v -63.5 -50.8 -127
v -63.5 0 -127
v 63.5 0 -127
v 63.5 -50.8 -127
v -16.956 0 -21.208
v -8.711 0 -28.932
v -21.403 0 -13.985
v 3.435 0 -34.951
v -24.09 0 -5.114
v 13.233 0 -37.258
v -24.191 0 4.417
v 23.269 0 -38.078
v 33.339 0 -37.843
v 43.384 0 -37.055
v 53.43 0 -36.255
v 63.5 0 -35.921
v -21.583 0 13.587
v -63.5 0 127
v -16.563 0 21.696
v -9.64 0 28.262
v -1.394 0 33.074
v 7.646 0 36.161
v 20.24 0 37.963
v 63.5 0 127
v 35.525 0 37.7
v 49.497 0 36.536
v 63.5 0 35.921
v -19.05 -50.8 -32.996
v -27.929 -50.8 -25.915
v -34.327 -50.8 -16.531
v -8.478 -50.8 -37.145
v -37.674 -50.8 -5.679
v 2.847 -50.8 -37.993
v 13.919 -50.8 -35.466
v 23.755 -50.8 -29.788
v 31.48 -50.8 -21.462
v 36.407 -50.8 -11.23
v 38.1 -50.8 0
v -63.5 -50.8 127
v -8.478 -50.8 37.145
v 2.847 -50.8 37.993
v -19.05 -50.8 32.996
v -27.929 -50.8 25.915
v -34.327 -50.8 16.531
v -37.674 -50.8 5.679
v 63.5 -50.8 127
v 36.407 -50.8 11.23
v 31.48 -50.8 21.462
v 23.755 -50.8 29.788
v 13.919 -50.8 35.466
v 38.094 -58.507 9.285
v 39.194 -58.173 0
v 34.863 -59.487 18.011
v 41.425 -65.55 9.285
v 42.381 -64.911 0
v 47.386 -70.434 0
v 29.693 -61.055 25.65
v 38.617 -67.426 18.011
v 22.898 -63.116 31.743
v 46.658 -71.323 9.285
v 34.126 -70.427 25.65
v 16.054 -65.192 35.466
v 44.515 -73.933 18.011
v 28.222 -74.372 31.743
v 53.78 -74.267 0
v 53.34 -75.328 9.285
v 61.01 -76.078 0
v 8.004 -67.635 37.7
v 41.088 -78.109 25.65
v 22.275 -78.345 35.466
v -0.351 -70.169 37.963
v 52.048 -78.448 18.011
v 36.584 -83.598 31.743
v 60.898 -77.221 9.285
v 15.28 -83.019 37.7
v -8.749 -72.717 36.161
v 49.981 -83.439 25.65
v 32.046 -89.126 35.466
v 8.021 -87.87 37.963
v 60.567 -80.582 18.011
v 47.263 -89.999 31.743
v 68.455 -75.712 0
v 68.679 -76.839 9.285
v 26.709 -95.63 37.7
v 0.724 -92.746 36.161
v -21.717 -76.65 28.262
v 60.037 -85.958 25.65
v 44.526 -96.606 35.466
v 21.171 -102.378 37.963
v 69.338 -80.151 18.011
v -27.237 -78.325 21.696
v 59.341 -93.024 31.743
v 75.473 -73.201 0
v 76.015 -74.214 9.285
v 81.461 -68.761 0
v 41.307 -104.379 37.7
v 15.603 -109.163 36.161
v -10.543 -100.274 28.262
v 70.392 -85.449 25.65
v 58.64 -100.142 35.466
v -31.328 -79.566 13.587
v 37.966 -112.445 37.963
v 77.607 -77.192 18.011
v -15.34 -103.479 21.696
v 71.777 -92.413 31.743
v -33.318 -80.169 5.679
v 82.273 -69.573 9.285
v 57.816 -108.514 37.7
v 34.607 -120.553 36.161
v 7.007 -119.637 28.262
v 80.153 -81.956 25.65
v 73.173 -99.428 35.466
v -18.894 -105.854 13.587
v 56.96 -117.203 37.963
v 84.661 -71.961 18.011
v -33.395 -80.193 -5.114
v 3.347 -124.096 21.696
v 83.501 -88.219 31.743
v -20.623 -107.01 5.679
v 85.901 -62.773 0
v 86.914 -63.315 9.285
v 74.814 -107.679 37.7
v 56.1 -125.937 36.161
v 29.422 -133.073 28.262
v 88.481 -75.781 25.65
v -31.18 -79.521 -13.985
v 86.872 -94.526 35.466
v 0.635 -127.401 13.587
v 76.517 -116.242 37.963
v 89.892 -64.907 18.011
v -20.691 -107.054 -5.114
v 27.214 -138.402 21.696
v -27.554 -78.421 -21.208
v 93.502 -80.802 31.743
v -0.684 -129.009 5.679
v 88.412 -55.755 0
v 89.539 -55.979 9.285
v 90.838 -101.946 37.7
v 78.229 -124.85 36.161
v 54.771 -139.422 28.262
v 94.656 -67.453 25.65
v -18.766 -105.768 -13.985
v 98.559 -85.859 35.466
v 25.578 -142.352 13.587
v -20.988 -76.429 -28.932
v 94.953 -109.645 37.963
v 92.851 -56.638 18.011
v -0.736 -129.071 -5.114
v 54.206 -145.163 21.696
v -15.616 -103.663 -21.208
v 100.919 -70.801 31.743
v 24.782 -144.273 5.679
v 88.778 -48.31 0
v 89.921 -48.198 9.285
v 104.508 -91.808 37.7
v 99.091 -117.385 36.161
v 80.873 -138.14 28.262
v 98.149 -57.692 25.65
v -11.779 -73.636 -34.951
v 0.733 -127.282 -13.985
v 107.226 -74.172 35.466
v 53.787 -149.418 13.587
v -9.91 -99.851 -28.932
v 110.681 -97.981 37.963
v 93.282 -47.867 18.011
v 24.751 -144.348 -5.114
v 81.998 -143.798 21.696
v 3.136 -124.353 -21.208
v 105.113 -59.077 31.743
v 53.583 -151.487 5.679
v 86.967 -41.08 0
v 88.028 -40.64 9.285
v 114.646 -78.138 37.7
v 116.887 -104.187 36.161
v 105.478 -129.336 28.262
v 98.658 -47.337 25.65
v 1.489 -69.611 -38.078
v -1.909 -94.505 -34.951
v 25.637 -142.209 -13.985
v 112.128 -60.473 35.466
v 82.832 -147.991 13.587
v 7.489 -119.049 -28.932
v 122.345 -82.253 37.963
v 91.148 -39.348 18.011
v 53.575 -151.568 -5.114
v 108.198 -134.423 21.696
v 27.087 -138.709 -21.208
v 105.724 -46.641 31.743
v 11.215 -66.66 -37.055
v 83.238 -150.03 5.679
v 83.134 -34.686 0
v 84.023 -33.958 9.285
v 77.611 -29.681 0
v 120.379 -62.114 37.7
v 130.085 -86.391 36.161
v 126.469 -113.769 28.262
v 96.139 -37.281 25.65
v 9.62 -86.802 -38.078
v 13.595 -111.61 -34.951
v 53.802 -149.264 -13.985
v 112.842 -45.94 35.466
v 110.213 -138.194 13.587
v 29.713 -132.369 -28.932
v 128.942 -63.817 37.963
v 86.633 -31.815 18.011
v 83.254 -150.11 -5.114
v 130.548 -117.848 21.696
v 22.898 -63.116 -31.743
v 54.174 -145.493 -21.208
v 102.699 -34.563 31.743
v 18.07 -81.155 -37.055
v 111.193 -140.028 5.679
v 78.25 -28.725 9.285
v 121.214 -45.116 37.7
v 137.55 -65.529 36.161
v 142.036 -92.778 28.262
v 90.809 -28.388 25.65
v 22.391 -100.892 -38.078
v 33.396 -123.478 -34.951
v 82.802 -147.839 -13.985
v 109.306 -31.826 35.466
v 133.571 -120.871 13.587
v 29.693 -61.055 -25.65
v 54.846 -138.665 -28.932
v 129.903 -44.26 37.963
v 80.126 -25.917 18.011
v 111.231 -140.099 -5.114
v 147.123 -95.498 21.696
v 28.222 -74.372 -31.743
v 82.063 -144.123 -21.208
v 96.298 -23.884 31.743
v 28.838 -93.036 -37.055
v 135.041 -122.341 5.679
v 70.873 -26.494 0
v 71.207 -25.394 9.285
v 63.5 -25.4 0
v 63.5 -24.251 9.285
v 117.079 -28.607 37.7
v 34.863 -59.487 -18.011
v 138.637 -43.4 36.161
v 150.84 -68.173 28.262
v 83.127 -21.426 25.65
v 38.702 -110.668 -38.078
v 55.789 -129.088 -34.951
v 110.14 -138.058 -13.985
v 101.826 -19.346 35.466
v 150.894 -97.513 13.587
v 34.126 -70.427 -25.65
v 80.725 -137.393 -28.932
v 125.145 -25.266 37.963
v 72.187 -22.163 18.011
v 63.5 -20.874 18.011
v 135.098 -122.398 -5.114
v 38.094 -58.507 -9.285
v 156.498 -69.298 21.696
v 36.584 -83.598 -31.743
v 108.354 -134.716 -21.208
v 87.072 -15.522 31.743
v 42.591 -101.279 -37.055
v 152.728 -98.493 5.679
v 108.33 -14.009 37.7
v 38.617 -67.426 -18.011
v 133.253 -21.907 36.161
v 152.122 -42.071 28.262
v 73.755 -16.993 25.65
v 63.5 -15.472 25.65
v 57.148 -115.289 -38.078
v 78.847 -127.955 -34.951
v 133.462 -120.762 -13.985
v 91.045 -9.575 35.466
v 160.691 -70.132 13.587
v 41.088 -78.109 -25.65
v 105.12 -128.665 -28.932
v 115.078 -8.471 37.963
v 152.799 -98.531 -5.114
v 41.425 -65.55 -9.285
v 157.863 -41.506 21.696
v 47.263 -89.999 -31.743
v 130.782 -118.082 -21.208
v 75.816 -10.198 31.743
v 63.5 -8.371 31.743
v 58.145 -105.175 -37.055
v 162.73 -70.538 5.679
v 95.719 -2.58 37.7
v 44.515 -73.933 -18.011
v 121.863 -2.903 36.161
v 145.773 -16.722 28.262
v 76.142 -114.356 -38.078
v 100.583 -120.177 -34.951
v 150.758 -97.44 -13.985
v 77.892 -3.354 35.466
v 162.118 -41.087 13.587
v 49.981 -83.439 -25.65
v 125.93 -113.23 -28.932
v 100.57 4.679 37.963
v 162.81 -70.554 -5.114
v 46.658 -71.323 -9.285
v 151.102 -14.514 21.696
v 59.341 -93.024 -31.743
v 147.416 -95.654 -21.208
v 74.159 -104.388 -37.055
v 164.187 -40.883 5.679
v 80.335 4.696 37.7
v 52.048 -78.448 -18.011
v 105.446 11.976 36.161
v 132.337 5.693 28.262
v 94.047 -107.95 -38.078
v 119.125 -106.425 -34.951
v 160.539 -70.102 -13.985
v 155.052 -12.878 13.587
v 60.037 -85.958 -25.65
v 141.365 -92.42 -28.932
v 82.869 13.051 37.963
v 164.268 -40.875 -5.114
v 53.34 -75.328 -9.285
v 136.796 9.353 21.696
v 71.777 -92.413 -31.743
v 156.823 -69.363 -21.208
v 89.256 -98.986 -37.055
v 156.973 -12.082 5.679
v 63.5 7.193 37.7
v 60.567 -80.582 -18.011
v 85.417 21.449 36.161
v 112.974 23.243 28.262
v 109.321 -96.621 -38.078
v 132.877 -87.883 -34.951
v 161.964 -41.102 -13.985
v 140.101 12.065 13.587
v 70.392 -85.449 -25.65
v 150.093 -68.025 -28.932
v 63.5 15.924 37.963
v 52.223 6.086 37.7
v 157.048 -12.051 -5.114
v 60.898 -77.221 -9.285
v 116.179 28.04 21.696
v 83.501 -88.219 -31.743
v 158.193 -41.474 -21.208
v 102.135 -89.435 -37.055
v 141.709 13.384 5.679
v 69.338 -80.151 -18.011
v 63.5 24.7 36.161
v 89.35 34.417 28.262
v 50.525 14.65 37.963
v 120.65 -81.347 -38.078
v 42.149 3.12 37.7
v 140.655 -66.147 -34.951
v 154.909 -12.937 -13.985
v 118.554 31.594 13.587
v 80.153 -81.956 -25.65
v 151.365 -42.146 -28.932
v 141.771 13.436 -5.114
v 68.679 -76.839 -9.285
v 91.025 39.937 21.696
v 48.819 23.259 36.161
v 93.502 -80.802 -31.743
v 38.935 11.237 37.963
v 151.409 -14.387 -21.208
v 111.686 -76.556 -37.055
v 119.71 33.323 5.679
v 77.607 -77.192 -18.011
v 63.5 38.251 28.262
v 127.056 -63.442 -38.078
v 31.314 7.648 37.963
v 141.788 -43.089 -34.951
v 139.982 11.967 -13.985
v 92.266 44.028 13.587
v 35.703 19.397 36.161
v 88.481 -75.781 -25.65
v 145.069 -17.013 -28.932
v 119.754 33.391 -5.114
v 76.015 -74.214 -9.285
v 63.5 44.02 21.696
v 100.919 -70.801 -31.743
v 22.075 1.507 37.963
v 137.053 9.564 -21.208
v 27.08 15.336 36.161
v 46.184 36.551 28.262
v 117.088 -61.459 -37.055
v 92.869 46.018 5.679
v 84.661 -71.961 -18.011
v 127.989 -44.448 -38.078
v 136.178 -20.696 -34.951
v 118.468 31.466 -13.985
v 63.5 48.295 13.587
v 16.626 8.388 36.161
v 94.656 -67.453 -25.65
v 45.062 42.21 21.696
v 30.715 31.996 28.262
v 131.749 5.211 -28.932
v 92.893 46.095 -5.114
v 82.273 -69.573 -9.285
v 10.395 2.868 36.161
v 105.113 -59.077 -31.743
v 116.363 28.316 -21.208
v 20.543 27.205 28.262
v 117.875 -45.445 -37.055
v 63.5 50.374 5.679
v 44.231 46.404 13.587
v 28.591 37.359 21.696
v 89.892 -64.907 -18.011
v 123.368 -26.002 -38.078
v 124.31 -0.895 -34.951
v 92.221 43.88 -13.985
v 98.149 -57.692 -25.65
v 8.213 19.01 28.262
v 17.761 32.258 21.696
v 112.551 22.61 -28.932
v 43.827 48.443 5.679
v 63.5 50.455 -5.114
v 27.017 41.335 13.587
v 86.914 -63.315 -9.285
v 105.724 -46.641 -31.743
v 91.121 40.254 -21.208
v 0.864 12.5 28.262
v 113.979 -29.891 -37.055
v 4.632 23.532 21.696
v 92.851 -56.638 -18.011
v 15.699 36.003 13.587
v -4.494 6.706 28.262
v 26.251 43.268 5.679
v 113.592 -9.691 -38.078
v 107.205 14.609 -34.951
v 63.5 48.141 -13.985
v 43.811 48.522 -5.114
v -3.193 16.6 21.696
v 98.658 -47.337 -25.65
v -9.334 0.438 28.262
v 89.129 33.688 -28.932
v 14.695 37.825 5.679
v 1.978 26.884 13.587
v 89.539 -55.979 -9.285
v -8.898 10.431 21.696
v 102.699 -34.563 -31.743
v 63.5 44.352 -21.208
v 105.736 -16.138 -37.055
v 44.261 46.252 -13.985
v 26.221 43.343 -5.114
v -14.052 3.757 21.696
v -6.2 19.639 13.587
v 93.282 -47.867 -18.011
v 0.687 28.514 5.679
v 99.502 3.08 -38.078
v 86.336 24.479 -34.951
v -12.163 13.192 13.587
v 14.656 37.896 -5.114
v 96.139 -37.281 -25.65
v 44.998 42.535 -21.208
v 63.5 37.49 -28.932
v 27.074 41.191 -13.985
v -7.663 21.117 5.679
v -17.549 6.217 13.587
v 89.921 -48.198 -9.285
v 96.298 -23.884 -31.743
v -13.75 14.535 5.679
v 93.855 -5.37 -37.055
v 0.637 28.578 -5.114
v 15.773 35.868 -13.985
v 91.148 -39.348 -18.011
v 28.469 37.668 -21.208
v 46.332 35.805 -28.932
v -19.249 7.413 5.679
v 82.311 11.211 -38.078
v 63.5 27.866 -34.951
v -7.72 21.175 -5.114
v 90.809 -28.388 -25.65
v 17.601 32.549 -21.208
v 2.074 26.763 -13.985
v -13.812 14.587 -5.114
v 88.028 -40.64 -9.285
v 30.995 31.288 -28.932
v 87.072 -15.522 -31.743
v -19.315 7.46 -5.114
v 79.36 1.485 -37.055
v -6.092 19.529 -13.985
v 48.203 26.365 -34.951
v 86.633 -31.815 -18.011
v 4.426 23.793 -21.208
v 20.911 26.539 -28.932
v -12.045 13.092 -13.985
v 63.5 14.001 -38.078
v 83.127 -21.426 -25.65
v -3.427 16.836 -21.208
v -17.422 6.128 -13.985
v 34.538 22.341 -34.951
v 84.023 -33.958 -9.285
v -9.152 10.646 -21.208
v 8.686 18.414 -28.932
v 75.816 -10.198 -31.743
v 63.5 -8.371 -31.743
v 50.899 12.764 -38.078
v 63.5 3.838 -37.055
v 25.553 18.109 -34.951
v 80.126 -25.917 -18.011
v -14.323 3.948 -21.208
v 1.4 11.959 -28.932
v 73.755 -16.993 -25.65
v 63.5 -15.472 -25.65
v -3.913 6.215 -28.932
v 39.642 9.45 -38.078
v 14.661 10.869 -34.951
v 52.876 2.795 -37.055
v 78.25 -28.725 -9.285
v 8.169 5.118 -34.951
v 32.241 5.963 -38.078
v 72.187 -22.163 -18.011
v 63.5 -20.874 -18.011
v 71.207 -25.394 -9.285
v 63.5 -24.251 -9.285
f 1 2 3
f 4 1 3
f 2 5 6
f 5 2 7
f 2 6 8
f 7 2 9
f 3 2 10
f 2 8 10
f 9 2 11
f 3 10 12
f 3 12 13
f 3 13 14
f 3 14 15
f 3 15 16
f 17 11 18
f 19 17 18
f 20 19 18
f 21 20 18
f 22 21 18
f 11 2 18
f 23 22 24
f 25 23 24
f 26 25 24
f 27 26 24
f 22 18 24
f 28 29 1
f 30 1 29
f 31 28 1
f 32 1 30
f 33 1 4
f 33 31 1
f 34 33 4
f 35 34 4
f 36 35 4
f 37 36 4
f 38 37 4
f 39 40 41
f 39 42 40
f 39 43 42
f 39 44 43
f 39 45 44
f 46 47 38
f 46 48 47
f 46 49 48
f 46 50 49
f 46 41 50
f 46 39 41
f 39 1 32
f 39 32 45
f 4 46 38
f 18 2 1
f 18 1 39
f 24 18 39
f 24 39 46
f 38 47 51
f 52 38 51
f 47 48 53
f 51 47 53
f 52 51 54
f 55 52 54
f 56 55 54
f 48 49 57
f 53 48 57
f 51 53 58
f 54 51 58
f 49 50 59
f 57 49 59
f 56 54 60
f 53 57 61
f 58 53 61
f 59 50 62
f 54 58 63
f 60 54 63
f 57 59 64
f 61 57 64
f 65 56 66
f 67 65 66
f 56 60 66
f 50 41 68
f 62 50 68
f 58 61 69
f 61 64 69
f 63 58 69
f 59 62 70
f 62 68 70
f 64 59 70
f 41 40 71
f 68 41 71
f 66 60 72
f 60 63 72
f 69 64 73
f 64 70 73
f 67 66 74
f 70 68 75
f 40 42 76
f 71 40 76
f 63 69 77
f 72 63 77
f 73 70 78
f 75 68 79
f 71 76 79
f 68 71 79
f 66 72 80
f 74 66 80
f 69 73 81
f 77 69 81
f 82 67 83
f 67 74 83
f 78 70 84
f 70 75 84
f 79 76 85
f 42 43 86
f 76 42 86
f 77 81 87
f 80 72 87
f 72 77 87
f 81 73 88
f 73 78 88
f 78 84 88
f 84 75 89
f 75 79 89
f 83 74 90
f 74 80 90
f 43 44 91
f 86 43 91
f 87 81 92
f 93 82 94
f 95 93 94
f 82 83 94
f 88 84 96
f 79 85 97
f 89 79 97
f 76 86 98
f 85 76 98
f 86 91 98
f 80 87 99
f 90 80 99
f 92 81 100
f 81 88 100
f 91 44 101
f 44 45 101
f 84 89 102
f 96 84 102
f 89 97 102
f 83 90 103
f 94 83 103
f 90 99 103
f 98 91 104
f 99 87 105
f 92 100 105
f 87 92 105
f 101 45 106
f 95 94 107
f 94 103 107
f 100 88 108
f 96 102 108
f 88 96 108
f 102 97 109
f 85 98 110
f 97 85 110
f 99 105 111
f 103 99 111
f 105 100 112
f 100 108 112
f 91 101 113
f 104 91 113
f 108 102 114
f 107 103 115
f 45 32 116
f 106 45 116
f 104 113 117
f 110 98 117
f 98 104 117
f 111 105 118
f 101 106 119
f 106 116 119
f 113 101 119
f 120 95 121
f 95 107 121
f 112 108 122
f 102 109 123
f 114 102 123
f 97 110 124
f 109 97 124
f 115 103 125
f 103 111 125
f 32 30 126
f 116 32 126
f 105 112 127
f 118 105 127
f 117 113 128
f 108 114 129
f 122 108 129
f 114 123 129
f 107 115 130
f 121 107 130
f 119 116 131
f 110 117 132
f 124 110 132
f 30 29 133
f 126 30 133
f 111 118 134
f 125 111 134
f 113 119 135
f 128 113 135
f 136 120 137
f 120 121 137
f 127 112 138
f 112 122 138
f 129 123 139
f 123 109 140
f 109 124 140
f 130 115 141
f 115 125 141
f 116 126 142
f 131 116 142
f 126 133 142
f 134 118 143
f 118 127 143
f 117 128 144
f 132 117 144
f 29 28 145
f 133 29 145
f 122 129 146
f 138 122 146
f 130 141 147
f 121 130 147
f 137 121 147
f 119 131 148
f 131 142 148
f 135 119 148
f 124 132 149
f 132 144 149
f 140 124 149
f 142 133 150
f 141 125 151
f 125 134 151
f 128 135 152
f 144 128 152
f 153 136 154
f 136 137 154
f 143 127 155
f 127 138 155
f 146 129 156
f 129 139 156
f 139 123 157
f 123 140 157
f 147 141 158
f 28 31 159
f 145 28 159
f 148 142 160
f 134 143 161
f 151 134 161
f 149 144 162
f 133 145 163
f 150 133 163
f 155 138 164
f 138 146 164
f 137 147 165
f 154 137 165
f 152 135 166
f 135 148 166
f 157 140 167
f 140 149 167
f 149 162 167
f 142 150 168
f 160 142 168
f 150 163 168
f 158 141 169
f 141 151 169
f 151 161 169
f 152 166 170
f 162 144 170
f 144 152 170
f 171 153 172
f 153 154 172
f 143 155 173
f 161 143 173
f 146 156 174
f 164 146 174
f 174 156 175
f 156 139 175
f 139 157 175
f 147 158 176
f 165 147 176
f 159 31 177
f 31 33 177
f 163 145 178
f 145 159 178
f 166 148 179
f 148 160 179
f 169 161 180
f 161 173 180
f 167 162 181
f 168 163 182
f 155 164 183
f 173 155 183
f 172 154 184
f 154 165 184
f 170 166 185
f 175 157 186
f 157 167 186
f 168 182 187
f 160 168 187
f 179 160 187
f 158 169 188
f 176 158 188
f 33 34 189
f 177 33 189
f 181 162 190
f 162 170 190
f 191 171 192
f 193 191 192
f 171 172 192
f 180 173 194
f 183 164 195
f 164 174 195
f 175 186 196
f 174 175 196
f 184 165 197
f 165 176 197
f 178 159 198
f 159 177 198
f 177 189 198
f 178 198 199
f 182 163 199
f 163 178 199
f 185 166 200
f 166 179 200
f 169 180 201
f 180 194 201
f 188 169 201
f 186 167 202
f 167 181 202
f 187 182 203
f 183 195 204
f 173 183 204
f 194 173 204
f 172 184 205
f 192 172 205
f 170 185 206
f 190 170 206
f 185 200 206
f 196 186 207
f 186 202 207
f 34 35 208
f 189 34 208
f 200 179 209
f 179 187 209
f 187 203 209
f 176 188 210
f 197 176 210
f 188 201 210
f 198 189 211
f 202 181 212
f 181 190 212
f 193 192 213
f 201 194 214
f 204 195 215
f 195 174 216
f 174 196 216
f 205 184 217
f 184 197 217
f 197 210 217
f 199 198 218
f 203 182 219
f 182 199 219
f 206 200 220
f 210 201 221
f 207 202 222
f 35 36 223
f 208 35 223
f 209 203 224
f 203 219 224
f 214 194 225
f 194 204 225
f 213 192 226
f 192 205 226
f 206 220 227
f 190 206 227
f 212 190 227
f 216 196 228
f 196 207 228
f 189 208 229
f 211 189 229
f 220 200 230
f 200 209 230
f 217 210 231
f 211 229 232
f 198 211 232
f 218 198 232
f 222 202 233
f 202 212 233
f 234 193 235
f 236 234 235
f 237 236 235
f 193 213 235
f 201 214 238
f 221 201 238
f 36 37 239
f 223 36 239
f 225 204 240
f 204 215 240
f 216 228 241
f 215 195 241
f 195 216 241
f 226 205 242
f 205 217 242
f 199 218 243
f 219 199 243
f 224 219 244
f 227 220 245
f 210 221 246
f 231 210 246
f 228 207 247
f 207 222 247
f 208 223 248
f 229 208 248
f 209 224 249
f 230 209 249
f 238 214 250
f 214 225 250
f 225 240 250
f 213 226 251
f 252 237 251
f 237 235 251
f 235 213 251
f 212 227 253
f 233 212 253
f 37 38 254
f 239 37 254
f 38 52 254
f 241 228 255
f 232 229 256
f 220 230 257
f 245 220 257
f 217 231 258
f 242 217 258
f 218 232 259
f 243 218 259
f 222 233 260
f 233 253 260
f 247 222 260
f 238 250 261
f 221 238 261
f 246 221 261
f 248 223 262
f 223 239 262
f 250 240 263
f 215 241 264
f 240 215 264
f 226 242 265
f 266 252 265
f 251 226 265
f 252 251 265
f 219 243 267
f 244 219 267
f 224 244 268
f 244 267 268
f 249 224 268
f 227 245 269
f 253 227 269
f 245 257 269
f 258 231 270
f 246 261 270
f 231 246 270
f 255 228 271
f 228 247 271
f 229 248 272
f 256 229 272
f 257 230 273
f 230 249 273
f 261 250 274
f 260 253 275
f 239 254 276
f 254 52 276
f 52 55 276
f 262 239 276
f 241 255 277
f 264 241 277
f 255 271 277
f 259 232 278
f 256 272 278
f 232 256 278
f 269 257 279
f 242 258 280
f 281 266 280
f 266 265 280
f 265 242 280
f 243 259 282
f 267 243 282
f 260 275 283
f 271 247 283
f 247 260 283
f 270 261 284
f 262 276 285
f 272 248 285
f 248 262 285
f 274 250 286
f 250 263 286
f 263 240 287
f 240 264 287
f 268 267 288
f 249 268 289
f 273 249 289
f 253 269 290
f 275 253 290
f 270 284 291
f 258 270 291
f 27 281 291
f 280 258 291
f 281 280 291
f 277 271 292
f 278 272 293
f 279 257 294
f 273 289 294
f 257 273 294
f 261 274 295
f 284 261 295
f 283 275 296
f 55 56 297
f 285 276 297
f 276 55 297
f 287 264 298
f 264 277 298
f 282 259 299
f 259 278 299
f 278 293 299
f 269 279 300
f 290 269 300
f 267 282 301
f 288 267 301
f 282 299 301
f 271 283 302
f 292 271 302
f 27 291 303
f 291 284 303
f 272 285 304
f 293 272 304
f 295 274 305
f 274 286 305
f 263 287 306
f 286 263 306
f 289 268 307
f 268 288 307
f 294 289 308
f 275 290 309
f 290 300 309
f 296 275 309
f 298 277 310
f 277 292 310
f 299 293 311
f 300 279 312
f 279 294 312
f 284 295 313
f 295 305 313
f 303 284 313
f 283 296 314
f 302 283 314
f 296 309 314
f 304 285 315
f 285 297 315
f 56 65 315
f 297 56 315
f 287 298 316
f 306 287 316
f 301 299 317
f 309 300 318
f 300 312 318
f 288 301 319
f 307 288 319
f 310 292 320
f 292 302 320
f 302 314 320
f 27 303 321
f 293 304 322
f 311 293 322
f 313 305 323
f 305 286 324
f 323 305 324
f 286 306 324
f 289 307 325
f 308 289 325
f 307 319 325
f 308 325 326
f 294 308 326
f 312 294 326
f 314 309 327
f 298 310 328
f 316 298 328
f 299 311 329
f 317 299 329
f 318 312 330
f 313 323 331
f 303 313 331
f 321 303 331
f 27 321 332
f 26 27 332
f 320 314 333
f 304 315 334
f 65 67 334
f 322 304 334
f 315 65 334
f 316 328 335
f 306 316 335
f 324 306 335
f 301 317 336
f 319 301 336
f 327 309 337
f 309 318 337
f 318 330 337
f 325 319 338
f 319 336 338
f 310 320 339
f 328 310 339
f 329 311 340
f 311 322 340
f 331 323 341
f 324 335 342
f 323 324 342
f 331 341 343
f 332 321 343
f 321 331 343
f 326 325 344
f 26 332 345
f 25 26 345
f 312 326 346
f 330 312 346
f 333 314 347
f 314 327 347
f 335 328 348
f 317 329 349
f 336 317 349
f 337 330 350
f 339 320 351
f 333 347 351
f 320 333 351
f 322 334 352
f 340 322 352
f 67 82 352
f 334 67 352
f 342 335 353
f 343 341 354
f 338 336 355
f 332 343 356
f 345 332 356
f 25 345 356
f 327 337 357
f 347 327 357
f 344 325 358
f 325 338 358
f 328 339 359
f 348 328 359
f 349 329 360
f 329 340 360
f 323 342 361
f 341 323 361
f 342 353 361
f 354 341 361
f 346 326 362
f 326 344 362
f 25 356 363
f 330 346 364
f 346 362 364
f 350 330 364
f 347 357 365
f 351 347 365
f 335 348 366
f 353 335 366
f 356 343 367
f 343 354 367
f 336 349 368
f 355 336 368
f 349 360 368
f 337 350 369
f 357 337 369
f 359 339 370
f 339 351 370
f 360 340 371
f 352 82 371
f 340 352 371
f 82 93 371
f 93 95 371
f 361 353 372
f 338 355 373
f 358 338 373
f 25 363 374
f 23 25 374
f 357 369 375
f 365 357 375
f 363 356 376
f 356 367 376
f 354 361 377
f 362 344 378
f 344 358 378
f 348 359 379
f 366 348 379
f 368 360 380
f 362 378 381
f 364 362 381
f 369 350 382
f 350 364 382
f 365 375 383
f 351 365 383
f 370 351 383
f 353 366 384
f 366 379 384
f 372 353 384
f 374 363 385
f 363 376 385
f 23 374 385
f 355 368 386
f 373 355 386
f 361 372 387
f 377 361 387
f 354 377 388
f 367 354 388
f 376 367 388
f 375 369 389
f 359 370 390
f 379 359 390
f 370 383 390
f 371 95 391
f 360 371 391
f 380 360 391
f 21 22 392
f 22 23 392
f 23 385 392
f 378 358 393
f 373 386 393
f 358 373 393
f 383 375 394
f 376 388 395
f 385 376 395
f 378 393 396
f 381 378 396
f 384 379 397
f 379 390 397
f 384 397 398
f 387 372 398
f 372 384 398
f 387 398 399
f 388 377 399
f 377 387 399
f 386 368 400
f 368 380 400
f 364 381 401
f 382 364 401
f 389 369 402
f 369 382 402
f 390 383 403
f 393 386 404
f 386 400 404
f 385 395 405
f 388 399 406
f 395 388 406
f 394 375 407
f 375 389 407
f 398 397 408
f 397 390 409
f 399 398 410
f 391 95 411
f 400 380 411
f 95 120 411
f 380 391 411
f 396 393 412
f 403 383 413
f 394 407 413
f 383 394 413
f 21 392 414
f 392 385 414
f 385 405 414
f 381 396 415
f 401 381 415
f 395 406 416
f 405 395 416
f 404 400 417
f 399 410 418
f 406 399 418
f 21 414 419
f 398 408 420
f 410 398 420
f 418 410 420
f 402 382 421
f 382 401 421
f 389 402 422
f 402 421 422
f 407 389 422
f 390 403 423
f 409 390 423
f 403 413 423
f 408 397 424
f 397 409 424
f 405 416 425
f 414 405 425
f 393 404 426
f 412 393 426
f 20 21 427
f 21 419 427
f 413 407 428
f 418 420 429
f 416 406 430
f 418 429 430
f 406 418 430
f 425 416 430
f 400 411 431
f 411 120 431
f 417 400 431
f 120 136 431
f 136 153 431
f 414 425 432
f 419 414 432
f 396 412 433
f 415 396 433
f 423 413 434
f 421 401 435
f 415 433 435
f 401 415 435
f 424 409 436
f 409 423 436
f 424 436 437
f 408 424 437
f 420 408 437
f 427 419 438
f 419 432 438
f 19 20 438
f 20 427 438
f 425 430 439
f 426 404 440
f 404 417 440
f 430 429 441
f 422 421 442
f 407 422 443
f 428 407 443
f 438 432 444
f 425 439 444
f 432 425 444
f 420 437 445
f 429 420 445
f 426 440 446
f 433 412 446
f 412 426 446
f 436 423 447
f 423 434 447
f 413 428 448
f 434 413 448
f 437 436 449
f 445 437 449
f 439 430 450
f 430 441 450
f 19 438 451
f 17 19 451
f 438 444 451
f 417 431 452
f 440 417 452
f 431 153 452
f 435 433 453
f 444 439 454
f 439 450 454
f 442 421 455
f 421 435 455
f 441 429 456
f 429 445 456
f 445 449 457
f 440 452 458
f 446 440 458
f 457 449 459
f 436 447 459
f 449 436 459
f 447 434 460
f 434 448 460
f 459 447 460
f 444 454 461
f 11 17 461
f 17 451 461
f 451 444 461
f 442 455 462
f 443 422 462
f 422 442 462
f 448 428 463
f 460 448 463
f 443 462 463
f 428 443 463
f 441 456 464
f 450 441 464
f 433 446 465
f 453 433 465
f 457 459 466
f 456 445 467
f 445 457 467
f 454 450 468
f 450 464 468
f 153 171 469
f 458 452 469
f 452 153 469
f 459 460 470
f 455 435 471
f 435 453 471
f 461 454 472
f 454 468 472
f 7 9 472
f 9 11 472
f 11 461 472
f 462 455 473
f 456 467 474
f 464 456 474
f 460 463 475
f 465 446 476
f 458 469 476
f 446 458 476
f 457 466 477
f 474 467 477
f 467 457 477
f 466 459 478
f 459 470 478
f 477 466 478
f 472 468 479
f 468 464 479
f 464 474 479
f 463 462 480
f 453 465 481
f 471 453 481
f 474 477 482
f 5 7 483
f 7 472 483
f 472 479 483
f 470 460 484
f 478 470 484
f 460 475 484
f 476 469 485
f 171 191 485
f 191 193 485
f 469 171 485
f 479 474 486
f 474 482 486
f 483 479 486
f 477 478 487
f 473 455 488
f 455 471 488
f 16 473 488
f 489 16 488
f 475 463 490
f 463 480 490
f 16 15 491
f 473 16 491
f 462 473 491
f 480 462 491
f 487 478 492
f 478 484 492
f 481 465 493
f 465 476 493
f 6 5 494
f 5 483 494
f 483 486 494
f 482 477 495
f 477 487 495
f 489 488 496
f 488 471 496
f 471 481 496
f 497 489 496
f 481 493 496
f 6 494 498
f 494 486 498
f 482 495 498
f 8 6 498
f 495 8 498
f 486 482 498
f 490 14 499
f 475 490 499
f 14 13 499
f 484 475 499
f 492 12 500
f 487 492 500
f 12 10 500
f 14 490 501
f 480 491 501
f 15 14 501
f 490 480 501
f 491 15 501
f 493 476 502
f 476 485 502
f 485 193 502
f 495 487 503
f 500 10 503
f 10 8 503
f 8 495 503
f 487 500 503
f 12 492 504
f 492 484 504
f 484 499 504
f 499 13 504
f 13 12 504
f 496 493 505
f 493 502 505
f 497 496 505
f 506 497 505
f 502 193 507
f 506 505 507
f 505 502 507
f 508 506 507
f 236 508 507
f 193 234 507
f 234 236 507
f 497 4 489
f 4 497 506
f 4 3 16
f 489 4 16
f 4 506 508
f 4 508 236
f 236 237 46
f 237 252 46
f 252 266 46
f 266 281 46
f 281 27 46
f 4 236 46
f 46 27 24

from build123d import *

# Parameters (mm, degrees)
F0_W     = 127
F0_H     = 254
F1_DEPTH = 50.8
F2_R     = 38.1


with BuildPart() as f1:
    # F0 (on Front) → F1 (new body)
    with BuildSketch(Plane.XZ):
        Rectangle(F0_W, F0_H)
    extrude(amount=F1_DEPTH)

    # F2 (on face) → F3 (revolve)
    with BuildSketch(Plane.XZ.offset(50.8)):
        Circle(F2_R)
    revolve(axis=Axis((63.5, -50.8, 0), (0, 0, 1)))


solid = f1.part
